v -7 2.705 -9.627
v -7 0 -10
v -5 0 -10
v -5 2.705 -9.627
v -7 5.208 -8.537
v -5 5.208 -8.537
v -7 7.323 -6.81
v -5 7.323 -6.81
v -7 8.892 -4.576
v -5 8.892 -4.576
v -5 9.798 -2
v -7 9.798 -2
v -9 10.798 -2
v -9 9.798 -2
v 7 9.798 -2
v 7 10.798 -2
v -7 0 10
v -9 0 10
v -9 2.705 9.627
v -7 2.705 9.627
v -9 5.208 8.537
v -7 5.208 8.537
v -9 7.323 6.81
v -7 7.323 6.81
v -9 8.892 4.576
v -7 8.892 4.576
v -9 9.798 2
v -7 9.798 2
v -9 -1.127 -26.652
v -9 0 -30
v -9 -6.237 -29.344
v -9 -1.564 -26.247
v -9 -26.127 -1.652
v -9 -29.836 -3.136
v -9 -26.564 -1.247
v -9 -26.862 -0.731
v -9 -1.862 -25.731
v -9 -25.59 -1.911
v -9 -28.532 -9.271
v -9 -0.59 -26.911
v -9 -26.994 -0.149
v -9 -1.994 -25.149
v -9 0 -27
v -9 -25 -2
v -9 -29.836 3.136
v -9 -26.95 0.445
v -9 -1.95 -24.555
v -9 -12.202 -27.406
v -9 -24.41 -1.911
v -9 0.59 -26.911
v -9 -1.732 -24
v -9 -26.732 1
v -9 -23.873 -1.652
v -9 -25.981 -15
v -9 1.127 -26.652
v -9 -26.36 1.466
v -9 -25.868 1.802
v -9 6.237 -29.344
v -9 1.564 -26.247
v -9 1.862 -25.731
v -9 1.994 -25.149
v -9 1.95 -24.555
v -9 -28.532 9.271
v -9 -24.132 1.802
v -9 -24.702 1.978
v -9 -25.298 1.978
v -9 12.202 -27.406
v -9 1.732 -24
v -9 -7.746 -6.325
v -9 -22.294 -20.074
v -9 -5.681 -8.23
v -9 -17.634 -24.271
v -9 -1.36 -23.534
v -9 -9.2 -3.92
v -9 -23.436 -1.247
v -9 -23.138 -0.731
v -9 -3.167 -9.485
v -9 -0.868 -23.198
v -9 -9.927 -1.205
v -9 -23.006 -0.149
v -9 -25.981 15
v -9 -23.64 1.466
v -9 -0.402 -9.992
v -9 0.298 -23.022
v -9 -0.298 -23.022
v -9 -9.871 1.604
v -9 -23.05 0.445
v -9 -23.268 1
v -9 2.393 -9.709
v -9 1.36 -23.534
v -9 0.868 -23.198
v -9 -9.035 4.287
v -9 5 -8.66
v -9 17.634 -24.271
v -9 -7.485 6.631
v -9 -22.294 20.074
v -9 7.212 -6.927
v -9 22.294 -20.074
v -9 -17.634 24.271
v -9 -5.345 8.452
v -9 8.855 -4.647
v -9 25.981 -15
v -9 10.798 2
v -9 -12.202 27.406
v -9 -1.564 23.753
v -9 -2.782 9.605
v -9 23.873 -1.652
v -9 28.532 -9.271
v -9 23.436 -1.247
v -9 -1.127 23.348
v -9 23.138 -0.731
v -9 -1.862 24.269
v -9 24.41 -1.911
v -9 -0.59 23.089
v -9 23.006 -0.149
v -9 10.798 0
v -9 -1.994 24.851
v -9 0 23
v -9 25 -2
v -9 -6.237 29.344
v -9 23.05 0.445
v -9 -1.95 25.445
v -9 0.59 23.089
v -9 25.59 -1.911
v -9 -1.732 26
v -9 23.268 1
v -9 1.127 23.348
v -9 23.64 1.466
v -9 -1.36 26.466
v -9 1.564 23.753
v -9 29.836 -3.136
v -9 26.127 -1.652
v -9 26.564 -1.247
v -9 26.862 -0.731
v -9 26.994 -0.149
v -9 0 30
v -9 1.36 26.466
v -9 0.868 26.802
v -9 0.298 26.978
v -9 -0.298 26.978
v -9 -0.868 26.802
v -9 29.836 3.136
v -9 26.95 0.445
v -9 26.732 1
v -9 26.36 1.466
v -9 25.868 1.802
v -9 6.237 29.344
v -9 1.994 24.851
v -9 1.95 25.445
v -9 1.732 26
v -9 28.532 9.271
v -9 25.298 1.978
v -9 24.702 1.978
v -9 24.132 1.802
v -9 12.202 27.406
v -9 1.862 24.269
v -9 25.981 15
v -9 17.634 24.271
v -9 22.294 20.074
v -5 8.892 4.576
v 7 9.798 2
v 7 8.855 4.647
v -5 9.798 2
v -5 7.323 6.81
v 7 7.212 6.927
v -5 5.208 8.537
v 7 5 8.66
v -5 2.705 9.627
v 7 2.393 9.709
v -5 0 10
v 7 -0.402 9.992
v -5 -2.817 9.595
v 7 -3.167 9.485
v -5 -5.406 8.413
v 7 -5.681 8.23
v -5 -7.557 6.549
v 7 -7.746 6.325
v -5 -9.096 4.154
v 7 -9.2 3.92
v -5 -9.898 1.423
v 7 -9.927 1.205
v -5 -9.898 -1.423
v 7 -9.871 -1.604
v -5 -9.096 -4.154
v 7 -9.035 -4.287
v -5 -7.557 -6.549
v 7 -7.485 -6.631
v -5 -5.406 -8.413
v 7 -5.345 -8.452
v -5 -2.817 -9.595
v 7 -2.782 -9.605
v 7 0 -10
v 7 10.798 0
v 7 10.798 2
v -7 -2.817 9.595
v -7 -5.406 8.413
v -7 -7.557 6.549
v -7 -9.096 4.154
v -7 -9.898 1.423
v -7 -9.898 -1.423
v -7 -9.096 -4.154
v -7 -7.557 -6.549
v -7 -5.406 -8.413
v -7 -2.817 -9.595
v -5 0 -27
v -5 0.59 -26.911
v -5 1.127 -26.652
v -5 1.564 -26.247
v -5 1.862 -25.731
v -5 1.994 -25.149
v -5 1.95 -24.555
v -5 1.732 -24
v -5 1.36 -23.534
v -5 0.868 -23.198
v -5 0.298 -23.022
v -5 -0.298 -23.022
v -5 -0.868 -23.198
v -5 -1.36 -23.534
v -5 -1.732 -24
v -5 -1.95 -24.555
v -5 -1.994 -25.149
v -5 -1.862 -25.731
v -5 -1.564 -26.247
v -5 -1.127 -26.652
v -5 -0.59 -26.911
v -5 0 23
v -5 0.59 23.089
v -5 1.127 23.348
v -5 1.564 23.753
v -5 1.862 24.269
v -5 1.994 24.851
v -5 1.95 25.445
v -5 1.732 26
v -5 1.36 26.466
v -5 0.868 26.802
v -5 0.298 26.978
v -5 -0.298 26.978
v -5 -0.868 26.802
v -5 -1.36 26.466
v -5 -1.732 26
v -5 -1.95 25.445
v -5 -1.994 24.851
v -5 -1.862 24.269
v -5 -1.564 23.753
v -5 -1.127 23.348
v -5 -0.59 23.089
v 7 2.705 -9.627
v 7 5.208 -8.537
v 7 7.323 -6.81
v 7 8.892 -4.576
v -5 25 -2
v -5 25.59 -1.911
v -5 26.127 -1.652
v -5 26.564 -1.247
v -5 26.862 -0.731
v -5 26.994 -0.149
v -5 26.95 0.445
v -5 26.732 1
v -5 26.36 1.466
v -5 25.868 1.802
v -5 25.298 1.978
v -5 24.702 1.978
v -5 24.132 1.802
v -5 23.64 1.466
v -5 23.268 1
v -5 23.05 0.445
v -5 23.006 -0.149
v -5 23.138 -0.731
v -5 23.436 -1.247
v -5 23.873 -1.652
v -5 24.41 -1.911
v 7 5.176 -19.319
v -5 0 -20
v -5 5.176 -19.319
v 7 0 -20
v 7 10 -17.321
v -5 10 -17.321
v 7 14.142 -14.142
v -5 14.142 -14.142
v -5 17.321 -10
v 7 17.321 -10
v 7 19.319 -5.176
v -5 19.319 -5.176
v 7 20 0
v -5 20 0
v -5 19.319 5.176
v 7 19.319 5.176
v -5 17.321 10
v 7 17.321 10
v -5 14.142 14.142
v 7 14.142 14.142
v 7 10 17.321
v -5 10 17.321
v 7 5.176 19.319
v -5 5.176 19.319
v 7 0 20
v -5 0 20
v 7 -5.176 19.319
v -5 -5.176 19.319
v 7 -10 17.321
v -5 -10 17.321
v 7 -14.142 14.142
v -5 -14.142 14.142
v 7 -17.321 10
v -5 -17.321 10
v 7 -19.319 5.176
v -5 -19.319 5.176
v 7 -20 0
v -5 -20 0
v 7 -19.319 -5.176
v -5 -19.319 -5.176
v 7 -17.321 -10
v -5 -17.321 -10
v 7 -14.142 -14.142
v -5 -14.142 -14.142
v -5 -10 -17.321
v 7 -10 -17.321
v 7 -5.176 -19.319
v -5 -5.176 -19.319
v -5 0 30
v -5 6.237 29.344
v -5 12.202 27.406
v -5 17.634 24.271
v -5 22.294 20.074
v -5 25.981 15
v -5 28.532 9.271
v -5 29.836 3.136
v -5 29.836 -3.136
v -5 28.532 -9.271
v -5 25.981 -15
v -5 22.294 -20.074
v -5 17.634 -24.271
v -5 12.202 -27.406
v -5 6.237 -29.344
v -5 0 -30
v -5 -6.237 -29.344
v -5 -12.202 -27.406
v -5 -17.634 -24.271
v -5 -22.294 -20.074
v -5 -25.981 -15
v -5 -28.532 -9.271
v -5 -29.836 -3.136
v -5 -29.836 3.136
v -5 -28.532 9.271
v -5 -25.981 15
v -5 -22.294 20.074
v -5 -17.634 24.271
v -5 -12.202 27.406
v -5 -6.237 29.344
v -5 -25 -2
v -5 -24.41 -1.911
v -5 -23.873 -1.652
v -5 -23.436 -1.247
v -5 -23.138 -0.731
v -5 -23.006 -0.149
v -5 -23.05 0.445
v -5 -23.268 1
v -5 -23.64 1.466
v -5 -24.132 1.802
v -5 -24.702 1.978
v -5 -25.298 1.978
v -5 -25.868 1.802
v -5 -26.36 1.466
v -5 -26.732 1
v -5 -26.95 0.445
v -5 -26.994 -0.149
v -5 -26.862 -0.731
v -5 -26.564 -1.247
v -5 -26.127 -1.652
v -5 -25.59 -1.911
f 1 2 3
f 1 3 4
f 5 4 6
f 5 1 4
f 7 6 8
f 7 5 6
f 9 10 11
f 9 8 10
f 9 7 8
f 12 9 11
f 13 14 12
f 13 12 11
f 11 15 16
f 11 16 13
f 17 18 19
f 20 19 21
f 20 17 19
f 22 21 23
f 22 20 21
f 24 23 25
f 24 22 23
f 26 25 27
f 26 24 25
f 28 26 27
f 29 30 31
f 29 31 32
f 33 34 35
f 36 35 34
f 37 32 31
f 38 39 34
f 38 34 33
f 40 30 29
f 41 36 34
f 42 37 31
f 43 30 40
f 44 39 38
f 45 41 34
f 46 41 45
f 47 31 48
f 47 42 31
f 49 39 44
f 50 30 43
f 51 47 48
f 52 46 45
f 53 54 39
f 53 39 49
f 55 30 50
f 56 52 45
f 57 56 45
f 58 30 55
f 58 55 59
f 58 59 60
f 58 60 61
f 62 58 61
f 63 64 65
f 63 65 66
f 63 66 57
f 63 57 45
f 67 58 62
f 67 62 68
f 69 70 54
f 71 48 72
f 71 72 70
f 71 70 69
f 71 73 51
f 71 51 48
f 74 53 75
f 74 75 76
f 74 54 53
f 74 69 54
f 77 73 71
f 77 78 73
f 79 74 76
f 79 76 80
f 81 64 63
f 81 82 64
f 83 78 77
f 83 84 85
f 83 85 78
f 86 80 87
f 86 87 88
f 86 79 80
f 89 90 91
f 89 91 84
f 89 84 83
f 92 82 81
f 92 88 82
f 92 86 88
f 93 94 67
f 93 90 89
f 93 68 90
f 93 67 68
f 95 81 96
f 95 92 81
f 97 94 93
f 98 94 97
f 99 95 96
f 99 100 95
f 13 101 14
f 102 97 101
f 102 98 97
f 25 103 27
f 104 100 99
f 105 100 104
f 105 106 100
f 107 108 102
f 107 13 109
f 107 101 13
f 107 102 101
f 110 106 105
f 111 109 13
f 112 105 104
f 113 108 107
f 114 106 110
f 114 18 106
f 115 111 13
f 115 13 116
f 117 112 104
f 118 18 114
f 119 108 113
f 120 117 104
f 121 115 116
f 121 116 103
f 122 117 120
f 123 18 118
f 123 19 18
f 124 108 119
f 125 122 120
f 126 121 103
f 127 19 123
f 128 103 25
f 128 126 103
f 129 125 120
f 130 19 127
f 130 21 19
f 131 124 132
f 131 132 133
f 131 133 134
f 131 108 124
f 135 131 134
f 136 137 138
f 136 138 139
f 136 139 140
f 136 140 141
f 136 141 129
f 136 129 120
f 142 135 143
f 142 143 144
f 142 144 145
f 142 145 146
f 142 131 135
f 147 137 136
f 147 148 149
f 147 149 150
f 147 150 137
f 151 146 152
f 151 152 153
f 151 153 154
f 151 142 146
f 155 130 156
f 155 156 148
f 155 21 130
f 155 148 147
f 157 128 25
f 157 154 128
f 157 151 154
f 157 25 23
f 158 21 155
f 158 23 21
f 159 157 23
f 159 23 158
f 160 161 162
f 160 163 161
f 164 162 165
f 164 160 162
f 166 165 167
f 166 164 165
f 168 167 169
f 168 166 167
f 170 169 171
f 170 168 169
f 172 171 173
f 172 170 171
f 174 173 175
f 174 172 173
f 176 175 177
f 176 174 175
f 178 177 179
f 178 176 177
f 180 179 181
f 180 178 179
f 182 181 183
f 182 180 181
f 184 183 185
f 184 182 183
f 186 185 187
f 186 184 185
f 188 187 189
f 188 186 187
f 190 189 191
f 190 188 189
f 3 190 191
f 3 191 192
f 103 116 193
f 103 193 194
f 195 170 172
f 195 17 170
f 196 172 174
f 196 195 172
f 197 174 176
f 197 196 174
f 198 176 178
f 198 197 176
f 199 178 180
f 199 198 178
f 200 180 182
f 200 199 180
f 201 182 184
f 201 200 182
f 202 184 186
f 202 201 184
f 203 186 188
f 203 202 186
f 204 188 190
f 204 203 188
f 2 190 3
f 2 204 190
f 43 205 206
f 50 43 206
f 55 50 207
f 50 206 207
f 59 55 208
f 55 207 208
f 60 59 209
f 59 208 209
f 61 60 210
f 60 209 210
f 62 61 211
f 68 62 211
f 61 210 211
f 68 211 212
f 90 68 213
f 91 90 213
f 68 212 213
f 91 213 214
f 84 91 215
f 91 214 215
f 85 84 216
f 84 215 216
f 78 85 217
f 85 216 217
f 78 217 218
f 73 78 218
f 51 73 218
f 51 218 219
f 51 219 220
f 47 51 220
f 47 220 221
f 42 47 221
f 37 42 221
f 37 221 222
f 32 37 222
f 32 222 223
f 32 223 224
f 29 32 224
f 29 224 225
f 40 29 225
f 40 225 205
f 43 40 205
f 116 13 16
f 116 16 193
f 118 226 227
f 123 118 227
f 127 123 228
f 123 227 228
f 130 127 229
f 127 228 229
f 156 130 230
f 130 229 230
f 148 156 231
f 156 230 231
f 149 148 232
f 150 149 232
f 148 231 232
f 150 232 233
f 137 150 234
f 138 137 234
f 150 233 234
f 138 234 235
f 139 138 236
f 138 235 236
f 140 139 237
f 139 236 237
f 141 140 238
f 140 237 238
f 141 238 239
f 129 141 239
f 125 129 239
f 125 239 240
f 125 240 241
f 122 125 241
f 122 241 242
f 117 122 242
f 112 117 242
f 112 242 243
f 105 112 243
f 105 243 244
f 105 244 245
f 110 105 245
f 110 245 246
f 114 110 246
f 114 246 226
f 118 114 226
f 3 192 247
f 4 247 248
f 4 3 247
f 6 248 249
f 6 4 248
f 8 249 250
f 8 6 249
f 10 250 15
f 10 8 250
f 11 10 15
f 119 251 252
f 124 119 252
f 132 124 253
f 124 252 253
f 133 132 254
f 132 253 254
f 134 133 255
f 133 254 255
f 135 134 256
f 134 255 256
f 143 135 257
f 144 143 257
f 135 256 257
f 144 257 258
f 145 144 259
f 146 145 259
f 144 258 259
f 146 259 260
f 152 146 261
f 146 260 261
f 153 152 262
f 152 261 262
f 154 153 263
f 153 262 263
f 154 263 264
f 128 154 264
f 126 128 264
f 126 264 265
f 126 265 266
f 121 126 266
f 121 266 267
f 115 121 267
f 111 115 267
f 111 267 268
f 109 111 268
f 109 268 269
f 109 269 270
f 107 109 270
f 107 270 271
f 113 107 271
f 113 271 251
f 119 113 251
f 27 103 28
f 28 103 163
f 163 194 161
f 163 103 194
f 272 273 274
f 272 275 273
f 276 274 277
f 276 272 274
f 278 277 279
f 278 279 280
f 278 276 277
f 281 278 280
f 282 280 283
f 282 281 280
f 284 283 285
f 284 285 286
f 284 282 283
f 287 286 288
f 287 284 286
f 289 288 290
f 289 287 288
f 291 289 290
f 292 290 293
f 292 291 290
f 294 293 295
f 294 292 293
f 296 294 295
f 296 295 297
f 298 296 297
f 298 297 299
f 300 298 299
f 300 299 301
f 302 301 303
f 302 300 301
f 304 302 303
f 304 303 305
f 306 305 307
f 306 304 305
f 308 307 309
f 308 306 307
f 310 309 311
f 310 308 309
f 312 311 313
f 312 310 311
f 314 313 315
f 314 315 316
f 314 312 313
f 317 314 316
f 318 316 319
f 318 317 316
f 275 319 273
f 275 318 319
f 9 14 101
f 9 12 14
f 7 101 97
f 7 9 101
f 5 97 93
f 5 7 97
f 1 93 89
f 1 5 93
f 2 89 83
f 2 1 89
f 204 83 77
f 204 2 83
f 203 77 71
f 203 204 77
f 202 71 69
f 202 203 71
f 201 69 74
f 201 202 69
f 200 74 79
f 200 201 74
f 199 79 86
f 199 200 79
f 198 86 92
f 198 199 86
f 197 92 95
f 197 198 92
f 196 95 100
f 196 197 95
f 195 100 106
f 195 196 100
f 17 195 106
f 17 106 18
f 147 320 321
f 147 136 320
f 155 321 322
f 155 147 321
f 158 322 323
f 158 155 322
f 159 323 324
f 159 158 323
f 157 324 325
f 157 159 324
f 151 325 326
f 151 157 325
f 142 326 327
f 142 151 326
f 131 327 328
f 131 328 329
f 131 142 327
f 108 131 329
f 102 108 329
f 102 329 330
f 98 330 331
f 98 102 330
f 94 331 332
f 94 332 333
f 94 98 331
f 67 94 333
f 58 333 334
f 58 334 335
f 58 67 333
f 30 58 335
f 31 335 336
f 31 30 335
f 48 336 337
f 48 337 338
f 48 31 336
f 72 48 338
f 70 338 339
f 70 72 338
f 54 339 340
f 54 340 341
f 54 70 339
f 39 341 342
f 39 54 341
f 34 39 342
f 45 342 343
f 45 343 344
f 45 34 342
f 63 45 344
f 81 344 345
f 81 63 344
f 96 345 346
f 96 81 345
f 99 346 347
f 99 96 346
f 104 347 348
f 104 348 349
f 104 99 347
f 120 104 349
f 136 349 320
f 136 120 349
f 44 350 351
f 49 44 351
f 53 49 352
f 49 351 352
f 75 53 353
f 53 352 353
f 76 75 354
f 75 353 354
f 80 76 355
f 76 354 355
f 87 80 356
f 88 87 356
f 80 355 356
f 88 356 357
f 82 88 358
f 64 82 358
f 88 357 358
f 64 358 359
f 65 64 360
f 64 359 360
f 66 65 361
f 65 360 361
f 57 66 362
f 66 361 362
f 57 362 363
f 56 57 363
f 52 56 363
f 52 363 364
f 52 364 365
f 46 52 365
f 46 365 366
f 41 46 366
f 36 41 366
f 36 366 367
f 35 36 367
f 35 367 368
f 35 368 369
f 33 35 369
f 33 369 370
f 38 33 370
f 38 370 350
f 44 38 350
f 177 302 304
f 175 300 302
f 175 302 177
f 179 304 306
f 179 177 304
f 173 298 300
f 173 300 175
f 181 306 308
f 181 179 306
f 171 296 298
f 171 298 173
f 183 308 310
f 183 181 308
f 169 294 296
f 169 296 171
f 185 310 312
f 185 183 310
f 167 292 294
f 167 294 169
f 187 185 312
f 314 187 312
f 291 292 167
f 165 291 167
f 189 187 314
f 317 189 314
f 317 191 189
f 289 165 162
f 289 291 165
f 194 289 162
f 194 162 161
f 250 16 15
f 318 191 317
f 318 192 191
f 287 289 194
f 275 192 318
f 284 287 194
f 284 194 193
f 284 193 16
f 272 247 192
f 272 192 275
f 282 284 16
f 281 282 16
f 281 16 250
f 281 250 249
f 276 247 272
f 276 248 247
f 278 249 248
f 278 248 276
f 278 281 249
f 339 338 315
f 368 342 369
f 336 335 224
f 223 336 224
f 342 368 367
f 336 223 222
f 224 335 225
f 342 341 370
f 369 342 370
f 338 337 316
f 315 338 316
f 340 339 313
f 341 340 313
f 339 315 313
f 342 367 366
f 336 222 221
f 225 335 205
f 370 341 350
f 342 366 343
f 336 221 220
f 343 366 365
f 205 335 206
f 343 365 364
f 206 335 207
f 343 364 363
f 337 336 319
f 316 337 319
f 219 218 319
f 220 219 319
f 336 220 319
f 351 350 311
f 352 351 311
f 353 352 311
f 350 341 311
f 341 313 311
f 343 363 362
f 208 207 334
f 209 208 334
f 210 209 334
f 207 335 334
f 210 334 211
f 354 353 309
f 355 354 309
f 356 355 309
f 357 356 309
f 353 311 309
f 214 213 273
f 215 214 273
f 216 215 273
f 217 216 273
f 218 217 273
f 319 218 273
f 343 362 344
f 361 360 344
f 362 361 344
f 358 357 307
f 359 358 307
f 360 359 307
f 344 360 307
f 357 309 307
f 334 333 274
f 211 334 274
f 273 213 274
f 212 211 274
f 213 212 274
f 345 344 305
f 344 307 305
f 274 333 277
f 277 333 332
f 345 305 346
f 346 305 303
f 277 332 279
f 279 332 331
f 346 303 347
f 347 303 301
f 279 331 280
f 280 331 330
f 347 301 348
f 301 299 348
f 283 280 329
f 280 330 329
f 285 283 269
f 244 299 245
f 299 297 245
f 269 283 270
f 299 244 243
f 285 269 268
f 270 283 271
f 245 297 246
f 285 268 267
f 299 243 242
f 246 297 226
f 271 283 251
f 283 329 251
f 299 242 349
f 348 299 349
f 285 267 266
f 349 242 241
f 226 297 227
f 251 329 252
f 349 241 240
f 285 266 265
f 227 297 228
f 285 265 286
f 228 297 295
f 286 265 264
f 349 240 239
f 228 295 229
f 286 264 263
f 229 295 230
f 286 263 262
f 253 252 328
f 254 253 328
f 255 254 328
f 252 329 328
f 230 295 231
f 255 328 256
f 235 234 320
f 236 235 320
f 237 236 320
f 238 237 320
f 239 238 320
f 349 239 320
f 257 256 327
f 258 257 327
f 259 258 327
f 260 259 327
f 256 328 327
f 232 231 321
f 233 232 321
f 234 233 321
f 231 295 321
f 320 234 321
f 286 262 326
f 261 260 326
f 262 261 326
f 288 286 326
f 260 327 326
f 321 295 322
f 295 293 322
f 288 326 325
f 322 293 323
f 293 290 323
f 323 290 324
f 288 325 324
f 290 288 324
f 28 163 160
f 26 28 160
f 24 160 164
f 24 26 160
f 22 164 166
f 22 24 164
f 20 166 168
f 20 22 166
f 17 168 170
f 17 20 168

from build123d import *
from build123d.topology import SkipClean

# Parameters (mm, degrees)
SKETCH1_R           = 20
SKETCH1_R_2         = 10
BOSS_EXTRUDE1_DEPTH = 7
SKETCH2_R           = 30
SKETCH2_R_2         = 10
BOSS_EXTRUDE2_DEPTH = 2
SKETCH3_R           = 2
CUT_EXTRUDE1_DEPTH  = 45.09081537
CUT_EXTRUDE2_DEPTH  = 46.343136195


with BuildPart() as part:
    # Sketch1 → Boss-Extrude1 (new, symmetric)
    with BuildSketch(Plane(origin=(0, 0, 0), x_dir=(0, 0, -1), z_dir=(1, 0, 0))):
        Circle(SKETCH1_R)
        Circle(SKETCH1_R_2, mode=Mode.SUBTRACT)
    extrude(amount=BOSS_EXTRUDE1_DEPTH, both=True)

    # Sketch2 → Boss-Extrude2 (add, symmetric)
    with BuildSketch(Plane.ZY.offset(7)):
        Circle(SKETCH2_R)
        Circle(SKETCH2_R_2, mode=Mode.SUBTRACT)
    extrude(amount=BOSS_EXTRUDE2_DEPTH, both=True)

    # Sketch3 → Cut-Extrude1 (cut, through all)
    with BuildSketch(Plane(origin=(-5, 0, 0), x_dir=(0, 0, -1), z_dir=(1, 0, 0))):
        with Locations((0, 25)):
            Circle(SKETCH3_R)
        with Locations((25, 0)):
            Circle(SKETCH3_R)
        with Locations((0, -25)):
            Circle(SKETCH3_R)
        with Locations((-25, 0)):
            Circle(SKETCH3_R)
    extrude(amount=-CUT_EXTRUDE1_DEPTH, mode=Mode.SUBTRACT)

    # Sketch4 → Cut-Extrude2 (cut, through all)
    with SkipClean():  # the faces are left unmerged after this step: merging them gives an invalid solid
        with BuildSketch(Plane(origin=(7, 0, 0), x_dir=(0, 0, -1), z_dir=(1, 0, 0))):
            with BuildLine():
                ThreePointArc((-2, 9.797958971), (-1.00508962, 9.94936153), (0, 10))
                Line((0, 10), (0, 10.797958971))
                Line((0, 10.797958971), (-2, 10.797958971))
                Line((-2, 10.797958971), (-2, 9.797958971))
            make_face()
            with BuildLine():
                Line((0, 10.797958971), (0, 10))
                ThreePointArc((0, 10), (1.00508962, 9.94936153), (2, 9.797958971))
                Line((2, 9.797958971), (2, 10.797958971))
                Line((2, 10.797958971), (0, 10.797958971))
            make_face()
        extrude(amount=-CUT_EXTRUDE2_DEPTH, mode=Mode.SUBTRACT)


solid = part.part
